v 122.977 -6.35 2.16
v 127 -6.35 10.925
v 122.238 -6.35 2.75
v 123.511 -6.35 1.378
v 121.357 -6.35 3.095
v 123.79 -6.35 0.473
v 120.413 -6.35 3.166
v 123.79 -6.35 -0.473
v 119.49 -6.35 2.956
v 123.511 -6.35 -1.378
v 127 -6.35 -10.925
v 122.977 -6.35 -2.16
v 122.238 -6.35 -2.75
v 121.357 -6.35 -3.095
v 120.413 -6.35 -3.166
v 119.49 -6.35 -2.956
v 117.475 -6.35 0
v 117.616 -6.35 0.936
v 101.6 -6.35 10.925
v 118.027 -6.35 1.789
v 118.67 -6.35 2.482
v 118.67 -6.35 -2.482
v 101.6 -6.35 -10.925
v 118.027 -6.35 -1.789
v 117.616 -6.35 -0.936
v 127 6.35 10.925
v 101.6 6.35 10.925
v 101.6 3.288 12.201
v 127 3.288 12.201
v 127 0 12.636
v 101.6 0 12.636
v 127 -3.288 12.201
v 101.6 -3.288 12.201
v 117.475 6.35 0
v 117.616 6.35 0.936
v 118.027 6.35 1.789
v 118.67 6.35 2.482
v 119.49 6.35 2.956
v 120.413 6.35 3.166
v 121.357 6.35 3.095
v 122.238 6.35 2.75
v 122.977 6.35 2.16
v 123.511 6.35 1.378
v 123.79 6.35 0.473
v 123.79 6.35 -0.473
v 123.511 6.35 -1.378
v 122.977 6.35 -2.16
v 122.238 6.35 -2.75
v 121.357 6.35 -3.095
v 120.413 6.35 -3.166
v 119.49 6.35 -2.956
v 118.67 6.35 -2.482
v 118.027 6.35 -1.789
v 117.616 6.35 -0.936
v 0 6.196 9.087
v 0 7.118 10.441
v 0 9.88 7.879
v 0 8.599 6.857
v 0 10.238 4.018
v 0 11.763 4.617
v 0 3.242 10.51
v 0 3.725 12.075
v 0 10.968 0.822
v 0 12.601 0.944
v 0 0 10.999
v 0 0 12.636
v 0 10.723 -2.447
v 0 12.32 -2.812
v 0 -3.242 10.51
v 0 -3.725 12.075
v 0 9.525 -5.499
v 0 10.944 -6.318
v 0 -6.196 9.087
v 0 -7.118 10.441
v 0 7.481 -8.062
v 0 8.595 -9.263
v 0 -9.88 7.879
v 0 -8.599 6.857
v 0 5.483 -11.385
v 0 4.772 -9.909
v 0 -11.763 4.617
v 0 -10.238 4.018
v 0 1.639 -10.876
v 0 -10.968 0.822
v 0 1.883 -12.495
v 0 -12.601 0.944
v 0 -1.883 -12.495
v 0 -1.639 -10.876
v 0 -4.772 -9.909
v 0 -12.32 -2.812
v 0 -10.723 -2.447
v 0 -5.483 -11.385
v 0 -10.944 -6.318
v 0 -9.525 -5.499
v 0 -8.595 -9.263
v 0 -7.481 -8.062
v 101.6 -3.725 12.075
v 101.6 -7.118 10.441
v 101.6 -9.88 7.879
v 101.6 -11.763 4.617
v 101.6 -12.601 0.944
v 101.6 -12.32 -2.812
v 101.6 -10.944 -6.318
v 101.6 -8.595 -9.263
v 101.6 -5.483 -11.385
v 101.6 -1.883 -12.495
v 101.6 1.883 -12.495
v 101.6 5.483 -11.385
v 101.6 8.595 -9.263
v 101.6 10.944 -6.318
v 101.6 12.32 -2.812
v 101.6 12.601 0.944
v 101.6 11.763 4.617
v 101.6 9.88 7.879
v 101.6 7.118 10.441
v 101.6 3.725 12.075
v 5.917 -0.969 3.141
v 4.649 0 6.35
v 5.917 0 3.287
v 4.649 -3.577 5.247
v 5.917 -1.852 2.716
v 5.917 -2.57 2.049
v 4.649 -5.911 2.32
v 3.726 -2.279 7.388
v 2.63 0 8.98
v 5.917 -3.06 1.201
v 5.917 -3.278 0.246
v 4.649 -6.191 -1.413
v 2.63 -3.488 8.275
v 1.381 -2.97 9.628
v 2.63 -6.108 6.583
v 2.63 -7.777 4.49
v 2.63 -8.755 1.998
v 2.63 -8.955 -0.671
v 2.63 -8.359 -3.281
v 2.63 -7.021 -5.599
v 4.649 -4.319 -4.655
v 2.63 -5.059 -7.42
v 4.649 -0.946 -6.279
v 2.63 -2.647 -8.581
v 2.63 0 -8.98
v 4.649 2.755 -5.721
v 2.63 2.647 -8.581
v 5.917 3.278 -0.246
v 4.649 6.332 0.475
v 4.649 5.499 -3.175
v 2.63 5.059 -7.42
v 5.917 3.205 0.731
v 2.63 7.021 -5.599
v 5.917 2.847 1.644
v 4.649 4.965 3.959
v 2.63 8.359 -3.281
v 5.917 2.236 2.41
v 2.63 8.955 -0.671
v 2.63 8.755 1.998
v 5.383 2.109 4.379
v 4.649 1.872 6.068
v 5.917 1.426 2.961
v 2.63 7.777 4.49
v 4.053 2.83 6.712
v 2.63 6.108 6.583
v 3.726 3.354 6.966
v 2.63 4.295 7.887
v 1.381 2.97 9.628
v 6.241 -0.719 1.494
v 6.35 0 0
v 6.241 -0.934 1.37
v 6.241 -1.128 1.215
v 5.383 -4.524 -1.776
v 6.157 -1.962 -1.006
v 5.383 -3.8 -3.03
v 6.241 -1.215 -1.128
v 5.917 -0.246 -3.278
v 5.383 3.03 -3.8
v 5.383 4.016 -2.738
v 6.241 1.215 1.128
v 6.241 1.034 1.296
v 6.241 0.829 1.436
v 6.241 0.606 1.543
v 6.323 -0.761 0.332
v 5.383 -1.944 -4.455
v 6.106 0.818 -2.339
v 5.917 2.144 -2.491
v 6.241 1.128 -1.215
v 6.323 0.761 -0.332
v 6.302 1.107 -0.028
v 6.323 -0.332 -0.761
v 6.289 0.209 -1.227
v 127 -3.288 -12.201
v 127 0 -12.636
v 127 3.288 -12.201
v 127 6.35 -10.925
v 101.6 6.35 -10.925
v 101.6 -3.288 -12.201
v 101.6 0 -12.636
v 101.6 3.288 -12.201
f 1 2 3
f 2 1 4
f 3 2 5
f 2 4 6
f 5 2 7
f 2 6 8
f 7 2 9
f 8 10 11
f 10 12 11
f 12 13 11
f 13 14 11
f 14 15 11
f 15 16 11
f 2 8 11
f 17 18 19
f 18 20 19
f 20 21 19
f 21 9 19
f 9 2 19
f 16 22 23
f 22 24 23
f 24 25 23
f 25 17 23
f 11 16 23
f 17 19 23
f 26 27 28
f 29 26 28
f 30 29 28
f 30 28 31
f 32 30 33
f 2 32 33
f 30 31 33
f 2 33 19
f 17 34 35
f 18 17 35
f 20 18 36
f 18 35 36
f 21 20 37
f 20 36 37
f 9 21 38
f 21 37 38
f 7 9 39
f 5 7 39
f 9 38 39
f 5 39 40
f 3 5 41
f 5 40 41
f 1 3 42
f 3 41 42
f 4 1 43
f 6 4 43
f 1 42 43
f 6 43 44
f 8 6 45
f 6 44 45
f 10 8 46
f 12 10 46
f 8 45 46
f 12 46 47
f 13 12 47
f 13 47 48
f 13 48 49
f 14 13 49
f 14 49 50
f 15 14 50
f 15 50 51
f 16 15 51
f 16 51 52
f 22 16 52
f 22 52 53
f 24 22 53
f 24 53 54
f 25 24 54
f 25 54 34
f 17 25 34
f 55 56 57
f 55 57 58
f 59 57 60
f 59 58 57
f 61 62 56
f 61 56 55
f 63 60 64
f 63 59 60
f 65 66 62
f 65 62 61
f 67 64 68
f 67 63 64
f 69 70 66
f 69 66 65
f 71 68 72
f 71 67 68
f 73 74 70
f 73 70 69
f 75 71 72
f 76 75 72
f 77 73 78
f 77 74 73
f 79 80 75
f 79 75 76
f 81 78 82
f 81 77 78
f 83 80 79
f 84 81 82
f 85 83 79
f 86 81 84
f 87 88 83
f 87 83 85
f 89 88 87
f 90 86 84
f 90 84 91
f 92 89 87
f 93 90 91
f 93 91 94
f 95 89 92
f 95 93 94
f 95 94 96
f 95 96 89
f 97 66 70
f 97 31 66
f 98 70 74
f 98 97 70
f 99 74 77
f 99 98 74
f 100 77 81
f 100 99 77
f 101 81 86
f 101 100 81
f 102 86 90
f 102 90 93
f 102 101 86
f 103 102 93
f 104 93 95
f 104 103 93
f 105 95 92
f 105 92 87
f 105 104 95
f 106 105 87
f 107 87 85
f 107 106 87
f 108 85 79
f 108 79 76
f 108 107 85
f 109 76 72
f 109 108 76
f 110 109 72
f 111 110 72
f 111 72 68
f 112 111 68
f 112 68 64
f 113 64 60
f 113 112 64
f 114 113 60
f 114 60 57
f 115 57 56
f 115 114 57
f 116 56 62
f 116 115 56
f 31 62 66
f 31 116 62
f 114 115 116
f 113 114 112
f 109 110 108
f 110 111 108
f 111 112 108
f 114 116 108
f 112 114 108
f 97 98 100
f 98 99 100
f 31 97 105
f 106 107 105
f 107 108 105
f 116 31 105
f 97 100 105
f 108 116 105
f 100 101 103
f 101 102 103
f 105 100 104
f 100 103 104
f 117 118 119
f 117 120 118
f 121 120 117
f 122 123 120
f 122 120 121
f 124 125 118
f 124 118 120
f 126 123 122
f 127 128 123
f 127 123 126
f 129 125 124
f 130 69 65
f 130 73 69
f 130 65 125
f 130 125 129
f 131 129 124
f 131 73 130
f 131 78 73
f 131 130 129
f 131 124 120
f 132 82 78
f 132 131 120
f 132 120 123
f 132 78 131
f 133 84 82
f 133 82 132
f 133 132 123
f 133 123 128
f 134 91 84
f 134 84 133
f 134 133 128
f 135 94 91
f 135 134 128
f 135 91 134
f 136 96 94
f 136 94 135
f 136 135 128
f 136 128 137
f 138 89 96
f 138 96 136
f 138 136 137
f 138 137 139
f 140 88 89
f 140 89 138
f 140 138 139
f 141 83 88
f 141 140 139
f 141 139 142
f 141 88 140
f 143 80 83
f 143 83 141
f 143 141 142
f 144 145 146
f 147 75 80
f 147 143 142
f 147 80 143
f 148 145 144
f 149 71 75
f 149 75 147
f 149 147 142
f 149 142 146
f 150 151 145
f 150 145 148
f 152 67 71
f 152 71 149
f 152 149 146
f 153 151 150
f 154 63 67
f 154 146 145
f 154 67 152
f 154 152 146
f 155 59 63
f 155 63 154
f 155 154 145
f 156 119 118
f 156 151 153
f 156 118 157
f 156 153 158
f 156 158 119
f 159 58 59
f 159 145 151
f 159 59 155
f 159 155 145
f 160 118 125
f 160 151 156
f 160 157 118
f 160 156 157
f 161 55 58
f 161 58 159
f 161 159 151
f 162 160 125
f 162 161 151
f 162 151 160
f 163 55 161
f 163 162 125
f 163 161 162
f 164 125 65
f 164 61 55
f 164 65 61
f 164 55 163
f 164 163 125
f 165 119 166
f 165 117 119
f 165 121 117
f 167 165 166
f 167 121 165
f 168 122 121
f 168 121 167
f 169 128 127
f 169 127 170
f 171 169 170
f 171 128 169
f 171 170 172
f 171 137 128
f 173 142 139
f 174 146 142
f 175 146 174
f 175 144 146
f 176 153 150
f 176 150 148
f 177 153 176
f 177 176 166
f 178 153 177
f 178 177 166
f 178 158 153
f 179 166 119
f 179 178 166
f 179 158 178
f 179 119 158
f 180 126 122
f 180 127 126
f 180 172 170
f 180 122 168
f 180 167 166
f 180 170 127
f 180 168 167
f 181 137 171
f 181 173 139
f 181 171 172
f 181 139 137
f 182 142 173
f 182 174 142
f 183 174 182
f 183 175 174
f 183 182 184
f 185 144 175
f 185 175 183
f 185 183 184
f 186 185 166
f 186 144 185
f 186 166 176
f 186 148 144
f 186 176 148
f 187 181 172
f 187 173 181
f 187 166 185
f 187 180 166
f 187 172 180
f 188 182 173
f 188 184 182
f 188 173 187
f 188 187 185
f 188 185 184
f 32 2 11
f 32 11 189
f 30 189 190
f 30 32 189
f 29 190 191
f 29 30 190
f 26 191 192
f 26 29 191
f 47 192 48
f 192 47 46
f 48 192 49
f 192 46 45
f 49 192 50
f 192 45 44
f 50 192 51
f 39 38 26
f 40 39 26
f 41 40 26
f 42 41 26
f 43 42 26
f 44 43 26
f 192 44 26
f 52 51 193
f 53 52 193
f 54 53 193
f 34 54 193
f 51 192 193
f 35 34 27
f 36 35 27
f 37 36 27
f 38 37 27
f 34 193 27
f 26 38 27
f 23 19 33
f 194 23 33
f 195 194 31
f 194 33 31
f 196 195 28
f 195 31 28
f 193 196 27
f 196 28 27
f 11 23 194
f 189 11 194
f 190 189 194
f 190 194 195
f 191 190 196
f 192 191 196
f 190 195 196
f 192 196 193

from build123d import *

# Parameters (mm, degrees)
F0_W     = 101.6
F0_H     = 12.6365
F5_DEPTH = 25.4
F7_D     = 6.35


with BuildPart() as f1:
    # F0 (on Front) → F1 (revolve)
    with BuildSketch(Plane.XZ):
        with Locations((50.8, 6.31825)):
            Rectangle(F0_W, F0_H)
    revolve(axis=Axis((117.01182, 0, 0), (1, 0, 0)))

    # F2 (on Front) → F3 (revolve, cut)
    with BuildSketch(Plane.XZ):
        with BuildLine():
            Line((0, 0), (6.35, 0))
            ThreePointArc((6.35, 0), (4.648523, 6.35), (0, 10.998523))
            Line((0, 10.998523), (0, 0))
        make_face()
    revolve(axis=Axis((3.175, 0, 0), (1, 0, 0)), mode=Mode.SUBTRACT)


with BuildPart() as f5:
    # F4 (on face) → F5 (new body)
    with BuildSketch(Plane.YZ.offset(101.6)):
        with BuildLine():
            ThreePointArc((6.35, 10.925138), (0, 12.6365), (-6.35, 10.925138))
            Line((-6.35, 10.925138), (-6.35, -10.925138))
            ThreePointArc((-6.35, -10.925138), (0, -12.6365), (6.35, -10.925138))
            Line((6.35, -10.925138), (6.35, 10.925138))
        make_face()
    extrude(amount=F5_DEPTH)

    # F7 (through all)
    with Locations(Plane.XZ.offset(6.35)):
        with Locations((120.65, 0)):
            Hole(F7_D / 2)


solid = Compound([f1.part, f5.part])
